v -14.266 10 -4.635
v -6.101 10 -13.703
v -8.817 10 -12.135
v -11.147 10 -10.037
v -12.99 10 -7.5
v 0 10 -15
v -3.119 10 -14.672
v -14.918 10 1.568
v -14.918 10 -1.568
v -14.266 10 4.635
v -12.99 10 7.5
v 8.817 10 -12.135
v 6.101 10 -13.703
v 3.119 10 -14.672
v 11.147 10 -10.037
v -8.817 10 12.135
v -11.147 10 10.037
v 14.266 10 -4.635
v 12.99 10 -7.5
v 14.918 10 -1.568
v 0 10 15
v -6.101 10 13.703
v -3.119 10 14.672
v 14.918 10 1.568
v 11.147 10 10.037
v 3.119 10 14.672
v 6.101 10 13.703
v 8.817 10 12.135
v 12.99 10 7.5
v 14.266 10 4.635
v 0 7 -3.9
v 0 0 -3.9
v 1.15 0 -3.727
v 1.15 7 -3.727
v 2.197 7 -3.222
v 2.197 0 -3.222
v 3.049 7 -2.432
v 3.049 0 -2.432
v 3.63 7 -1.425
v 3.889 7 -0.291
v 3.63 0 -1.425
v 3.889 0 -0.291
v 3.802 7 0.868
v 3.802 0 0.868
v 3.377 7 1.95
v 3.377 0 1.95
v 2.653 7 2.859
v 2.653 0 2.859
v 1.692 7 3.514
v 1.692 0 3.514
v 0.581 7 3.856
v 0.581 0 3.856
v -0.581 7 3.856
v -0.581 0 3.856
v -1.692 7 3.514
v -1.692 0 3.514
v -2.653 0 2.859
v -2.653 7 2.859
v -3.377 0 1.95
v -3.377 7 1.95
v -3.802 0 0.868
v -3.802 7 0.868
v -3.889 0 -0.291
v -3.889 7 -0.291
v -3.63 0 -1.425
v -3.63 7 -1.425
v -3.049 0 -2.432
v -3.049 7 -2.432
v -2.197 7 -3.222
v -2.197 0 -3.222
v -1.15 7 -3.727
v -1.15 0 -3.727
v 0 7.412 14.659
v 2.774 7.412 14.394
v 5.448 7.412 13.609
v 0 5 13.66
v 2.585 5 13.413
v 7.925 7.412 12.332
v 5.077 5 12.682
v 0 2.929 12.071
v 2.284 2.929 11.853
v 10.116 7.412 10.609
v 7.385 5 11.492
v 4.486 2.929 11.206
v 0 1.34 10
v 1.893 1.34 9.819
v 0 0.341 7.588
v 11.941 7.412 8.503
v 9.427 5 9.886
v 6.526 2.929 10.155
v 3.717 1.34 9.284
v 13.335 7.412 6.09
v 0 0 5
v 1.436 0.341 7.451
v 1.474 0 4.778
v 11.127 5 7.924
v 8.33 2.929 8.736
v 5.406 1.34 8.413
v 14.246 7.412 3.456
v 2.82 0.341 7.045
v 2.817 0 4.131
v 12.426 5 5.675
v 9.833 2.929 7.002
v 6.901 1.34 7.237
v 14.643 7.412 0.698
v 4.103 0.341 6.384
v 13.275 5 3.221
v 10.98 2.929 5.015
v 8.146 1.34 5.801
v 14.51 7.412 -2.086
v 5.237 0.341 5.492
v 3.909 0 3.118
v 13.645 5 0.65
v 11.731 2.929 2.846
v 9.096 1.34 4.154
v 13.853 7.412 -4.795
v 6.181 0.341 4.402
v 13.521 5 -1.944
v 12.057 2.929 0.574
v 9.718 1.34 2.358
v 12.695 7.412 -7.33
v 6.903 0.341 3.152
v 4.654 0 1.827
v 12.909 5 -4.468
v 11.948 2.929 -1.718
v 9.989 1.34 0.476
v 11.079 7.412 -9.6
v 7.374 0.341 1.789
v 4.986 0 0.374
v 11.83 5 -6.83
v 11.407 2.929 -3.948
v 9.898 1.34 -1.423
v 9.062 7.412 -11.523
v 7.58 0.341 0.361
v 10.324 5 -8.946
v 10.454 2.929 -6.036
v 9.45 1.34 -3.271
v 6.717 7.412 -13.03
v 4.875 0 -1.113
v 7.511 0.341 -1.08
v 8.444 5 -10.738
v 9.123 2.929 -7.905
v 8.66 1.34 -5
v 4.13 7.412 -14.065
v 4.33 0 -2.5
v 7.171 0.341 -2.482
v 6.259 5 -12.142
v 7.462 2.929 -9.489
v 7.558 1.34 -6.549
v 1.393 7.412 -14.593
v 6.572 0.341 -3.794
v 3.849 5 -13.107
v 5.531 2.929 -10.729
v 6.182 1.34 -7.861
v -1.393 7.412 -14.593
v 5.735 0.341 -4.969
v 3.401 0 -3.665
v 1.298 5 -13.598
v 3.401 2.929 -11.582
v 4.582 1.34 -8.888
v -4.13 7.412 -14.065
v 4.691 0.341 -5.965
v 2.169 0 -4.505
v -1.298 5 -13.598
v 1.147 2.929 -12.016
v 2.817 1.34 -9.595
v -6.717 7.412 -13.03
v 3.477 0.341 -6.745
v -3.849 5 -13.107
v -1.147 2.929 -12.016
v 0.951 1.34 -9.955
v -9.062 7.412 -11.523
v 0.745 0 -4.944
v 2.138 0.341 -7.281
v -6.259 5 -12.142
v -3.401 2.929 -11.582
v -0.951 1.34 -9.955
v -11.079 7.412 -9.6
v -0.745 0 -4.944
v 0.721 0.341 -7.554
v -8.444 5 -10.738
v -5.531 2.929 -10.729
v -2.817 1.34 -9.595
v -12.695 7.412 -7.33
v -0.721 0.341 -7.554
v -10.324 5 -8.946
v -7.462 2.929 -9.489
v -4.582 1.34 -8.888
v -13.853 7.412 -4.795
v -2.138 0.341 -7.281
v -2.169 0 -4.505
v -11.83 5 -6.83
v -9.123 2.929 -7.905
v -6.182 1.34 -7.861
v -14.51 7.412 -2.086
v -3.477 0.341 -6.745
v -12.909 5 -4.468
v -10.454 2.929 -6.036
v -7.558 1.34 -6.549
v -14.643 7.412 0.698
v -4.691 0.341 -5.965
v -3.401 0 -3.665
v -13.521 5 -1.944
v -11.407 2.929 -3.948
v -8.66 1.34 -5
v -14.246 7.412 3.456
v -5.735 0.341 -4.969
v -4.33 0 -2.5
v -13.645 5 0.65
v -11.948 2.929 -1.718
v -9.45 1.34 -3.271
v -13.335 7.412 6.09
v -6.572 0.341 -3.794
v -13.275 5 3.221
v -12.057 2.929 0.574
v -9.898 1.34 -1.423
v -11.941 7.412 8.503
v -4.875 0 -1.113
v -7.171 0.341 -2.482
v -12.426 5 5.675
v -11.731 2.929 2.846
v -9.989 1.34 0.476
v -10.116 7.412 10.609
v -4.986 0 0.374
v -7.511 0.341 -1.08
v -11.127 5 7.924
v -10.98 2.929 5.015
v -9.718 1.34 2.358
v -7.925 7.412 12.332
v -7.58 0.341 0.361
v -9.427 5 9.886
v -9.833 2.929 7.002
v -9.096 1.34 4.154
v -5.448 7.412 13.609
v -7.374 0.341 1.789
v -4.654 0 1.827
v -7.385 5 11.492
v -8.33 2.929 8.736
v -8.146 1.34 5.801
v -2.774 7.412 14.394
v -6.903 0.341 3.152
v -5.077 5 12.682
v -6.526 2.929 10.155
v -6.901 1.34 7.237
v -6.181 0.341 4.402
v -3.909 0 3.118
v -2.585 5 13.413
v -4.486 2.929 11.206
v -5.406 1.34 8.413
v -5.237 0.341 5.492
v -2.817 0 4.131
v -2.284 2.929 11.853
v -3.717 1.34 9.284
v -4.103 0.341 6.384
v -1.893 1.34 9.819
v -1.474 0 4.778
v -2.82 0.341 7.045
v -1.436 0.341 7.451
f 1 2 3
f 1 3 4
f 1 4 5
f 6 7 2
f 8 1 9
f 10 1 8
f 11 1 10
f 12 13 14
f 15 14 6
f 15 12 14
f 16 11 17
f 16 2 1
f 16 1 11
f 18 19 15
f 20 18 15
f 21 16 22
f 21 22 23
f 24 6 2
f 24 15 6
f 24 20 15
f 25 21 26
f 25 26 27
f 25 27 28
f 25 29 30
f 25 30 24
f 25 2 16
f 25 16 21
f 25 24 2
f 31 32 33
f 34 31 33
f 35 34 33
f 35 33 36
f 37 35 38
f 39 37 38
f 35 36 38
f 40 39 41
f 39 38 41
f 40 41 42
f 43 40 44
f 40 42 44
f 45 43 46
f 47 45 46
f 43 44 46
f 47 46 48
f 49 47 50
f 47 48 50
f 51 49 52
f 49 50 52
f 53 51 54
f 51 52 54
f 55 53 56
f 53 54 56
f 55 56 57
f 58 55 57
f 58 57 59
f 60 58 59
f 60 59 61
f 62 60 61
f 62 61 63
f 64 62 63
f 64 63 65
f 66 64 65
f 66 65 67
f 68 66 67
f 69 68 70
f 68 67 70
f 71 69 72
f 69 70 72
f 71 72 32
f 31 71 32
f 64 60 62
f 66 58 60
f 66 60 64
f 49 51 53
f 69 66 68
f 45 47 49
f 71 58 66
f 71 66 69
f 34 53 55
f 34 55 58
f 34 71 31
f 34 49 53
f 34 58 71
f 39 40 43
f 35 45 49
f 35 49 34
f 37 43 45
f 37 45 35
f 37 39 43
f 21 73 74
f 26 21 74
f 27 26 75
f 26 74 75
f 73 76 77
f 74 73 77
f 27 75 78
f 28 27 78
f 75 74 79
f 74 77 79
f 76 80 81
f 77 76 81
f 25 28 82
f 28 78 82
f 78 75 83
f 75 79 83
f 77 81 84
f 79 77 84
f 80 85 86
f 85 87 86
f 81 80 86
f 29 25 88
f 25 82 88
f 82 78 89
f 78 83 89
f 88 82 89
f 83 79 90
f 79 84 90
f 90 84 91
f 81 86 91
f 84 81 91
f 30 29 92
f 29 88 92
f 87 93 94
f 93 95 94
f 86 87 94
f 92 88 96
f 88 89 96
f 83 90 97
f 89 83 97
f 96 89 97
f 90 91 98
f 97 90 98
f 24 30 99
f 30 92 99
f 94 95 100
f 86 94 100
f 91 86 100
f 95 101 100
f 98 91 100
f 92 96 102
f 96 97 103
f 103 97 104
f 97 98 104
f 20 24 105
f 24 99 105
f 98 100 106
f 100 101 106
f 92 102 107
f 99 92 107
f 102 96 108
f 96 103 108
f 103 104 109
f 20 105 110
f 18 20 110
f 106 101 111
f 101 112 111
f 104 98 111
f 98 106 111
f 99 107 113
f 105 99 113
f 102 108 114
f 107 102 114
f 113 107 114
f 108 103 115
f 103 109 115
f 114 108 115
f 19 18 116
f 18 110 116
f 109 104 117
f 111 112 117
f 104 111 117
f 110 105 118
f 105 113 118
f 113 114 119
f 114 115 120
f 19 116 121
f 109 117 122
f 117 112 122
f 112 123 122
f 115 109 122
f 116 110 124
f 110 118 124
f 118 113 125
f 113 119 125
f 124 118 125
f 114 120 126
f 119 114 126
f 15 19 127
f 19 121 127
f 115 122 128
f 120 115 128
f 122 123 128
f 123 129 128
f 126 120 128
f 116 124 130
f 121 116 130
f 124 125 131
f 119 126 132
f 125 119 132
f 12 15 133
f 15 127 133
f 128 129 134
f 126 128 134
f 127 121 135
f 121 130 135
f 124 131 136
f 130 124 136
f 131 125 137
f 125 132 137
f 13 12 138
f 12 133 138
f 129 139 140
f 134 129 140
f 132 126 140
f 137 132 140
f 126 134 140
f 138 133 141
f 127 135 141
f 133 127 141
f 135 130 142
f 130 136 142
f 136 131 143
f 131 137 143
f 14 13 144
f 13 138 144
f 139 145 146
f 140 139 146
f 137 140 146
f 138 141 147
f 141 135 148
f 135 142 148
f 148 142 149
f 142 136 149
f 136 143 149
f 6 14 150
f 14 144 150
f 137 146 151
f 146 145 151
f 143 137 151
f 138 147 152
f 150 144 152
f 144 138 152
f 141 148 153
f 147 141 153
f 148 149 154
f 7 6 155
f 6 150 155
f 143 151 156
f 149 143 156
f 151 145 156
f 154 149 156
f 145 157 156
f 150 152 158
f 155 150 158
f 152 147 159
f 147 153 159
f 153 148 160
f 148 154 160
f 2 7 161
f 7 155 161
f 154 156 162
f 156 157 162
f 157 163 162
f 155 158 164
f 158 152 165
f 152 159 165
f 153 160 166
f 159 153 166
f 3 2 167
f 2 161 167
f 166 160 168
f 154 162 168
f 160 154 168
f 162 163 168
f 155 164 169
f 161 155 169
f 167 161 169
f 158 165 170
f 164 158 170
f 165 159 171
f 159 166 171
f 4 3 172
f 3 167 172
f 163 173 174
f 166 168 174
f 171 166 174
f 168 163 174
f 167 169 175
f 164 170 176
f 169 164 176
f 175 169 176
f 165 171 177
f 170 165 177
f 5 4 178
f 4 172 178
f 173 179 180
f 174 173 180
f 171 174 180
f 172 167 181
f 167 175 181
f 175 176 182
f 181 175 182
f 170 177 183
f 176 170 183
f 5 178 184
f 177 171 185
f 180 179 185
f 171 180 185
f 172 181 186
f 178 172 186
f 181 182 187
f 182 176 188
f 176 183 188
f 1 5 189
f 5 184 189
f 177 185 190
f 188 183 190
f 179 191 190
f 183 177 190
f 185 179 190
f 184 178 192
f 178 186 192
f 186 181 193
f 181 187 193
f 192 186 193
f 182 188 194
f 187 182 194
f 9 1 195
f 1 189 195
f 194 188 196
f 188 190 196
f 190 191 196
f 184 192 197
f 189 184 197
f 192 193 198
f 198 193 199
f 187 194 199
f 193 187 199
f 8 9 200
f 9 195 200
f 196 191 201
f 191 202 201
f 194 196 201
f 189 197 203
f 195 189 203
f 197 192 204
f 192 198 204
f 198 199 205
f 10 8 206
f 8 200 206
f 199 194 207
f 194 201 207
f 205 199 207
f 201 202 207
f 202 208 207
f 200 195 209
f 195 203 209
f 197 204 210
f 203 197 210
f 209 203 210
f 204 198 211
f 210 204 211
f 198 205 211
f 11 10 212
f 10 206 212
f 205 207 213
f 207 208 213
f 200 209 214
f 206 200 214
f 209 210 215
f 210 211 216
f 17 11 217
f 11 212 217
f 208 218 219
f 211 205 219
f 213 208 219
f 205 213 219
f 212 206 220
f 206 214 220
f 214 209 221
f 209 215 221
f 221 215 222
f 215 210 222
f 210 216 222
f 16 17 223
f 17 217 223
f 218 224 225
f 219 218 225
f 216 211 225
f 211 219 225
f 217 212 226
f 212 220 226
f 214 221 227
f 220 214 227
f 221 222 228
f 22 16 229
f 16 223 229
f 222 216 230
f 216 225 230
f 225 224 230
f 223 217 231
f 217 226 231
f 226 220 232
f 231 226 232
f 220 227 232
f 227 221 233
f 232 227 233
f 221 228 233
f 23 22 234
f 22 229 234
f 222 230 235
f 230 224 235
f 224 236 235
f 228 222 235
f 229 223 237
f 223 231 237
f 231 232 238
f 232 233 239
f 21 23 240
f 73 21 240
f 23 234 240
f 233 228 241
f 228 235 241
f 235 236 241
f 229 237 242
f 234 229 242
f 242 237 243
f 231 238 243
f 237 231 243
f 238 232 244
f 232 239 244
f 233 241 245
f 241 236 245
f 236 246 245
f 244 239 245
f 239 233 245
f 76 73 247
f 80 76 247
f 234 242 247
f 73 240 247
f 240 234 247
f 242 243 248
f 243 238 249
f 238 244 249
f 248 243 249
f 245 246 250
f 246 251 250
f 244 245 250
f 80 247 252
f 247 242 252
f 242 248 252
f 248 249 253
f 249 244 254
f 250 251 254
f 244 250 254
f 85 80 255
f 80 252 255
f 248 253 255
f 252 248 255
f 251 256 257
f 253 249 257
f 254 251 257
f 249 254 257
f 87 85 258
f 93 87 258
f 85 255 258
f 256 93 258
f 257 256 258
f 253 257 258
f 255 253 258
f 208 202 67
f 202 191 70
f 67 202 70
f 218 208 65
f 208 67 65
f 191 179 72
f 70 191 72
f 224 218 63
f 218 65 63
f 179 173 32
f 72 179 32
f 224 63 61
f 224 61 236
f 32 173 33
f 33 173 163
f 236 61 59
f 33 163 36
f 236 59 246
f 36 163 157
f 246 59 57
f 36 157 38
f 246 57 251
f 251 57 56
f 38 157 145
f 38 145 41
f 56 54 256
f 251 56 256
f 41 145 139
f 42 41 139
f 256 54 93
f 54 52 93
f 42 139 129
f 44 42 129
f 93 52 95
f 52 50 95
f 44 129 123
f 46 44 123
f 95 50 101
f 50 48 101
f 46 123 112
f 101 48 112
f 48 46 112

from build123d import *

# Parameters (mm, degrees)
SKETCH1_R           = 15
BOSS_EXTRUDE1_DEPTH = 10
SKETCH2_R           = 3.9
CUT_EXTRUDE1_DEPTH  = 7
FILLET1_R           = 10


with BuildPart() as part:
    # Sketch1 → Boss-Extrude1 (new body)
    with BuildSketch(Plane(origin=(0, 0, 0), x_dir=(1, 0, 0), z_dir=(0, 1, 0))):
        with Locations(Location((0, 0, 0), (0, 0, 270))):
            Circle(SKETCH1_R)
    extrude(amount=BOSS_EXTRUDE1_DEPTH)

    # Sketch2 → Cut-Extrude1 (cut)
    with BuildSketch(Plane.XZ):
        with Locations(Location((0, 0, 0), (0, 0, 270))):
            Circle(SKETCH2_R)
    extrude(amount=-CUT_EXTRUDE1_DEPTH, mode=Mode.SUBTRACT)

    # Fillet1
    fillet1_edges = [part.edges().sort_by_distance(p)[0] for p in [
        (0, 0, -15),
    ]]
    fillet(fillet1_edges, radius=FILLET1_R - 0.0001)  # a hair under: the kernel refuses the full size


solid = part.part
